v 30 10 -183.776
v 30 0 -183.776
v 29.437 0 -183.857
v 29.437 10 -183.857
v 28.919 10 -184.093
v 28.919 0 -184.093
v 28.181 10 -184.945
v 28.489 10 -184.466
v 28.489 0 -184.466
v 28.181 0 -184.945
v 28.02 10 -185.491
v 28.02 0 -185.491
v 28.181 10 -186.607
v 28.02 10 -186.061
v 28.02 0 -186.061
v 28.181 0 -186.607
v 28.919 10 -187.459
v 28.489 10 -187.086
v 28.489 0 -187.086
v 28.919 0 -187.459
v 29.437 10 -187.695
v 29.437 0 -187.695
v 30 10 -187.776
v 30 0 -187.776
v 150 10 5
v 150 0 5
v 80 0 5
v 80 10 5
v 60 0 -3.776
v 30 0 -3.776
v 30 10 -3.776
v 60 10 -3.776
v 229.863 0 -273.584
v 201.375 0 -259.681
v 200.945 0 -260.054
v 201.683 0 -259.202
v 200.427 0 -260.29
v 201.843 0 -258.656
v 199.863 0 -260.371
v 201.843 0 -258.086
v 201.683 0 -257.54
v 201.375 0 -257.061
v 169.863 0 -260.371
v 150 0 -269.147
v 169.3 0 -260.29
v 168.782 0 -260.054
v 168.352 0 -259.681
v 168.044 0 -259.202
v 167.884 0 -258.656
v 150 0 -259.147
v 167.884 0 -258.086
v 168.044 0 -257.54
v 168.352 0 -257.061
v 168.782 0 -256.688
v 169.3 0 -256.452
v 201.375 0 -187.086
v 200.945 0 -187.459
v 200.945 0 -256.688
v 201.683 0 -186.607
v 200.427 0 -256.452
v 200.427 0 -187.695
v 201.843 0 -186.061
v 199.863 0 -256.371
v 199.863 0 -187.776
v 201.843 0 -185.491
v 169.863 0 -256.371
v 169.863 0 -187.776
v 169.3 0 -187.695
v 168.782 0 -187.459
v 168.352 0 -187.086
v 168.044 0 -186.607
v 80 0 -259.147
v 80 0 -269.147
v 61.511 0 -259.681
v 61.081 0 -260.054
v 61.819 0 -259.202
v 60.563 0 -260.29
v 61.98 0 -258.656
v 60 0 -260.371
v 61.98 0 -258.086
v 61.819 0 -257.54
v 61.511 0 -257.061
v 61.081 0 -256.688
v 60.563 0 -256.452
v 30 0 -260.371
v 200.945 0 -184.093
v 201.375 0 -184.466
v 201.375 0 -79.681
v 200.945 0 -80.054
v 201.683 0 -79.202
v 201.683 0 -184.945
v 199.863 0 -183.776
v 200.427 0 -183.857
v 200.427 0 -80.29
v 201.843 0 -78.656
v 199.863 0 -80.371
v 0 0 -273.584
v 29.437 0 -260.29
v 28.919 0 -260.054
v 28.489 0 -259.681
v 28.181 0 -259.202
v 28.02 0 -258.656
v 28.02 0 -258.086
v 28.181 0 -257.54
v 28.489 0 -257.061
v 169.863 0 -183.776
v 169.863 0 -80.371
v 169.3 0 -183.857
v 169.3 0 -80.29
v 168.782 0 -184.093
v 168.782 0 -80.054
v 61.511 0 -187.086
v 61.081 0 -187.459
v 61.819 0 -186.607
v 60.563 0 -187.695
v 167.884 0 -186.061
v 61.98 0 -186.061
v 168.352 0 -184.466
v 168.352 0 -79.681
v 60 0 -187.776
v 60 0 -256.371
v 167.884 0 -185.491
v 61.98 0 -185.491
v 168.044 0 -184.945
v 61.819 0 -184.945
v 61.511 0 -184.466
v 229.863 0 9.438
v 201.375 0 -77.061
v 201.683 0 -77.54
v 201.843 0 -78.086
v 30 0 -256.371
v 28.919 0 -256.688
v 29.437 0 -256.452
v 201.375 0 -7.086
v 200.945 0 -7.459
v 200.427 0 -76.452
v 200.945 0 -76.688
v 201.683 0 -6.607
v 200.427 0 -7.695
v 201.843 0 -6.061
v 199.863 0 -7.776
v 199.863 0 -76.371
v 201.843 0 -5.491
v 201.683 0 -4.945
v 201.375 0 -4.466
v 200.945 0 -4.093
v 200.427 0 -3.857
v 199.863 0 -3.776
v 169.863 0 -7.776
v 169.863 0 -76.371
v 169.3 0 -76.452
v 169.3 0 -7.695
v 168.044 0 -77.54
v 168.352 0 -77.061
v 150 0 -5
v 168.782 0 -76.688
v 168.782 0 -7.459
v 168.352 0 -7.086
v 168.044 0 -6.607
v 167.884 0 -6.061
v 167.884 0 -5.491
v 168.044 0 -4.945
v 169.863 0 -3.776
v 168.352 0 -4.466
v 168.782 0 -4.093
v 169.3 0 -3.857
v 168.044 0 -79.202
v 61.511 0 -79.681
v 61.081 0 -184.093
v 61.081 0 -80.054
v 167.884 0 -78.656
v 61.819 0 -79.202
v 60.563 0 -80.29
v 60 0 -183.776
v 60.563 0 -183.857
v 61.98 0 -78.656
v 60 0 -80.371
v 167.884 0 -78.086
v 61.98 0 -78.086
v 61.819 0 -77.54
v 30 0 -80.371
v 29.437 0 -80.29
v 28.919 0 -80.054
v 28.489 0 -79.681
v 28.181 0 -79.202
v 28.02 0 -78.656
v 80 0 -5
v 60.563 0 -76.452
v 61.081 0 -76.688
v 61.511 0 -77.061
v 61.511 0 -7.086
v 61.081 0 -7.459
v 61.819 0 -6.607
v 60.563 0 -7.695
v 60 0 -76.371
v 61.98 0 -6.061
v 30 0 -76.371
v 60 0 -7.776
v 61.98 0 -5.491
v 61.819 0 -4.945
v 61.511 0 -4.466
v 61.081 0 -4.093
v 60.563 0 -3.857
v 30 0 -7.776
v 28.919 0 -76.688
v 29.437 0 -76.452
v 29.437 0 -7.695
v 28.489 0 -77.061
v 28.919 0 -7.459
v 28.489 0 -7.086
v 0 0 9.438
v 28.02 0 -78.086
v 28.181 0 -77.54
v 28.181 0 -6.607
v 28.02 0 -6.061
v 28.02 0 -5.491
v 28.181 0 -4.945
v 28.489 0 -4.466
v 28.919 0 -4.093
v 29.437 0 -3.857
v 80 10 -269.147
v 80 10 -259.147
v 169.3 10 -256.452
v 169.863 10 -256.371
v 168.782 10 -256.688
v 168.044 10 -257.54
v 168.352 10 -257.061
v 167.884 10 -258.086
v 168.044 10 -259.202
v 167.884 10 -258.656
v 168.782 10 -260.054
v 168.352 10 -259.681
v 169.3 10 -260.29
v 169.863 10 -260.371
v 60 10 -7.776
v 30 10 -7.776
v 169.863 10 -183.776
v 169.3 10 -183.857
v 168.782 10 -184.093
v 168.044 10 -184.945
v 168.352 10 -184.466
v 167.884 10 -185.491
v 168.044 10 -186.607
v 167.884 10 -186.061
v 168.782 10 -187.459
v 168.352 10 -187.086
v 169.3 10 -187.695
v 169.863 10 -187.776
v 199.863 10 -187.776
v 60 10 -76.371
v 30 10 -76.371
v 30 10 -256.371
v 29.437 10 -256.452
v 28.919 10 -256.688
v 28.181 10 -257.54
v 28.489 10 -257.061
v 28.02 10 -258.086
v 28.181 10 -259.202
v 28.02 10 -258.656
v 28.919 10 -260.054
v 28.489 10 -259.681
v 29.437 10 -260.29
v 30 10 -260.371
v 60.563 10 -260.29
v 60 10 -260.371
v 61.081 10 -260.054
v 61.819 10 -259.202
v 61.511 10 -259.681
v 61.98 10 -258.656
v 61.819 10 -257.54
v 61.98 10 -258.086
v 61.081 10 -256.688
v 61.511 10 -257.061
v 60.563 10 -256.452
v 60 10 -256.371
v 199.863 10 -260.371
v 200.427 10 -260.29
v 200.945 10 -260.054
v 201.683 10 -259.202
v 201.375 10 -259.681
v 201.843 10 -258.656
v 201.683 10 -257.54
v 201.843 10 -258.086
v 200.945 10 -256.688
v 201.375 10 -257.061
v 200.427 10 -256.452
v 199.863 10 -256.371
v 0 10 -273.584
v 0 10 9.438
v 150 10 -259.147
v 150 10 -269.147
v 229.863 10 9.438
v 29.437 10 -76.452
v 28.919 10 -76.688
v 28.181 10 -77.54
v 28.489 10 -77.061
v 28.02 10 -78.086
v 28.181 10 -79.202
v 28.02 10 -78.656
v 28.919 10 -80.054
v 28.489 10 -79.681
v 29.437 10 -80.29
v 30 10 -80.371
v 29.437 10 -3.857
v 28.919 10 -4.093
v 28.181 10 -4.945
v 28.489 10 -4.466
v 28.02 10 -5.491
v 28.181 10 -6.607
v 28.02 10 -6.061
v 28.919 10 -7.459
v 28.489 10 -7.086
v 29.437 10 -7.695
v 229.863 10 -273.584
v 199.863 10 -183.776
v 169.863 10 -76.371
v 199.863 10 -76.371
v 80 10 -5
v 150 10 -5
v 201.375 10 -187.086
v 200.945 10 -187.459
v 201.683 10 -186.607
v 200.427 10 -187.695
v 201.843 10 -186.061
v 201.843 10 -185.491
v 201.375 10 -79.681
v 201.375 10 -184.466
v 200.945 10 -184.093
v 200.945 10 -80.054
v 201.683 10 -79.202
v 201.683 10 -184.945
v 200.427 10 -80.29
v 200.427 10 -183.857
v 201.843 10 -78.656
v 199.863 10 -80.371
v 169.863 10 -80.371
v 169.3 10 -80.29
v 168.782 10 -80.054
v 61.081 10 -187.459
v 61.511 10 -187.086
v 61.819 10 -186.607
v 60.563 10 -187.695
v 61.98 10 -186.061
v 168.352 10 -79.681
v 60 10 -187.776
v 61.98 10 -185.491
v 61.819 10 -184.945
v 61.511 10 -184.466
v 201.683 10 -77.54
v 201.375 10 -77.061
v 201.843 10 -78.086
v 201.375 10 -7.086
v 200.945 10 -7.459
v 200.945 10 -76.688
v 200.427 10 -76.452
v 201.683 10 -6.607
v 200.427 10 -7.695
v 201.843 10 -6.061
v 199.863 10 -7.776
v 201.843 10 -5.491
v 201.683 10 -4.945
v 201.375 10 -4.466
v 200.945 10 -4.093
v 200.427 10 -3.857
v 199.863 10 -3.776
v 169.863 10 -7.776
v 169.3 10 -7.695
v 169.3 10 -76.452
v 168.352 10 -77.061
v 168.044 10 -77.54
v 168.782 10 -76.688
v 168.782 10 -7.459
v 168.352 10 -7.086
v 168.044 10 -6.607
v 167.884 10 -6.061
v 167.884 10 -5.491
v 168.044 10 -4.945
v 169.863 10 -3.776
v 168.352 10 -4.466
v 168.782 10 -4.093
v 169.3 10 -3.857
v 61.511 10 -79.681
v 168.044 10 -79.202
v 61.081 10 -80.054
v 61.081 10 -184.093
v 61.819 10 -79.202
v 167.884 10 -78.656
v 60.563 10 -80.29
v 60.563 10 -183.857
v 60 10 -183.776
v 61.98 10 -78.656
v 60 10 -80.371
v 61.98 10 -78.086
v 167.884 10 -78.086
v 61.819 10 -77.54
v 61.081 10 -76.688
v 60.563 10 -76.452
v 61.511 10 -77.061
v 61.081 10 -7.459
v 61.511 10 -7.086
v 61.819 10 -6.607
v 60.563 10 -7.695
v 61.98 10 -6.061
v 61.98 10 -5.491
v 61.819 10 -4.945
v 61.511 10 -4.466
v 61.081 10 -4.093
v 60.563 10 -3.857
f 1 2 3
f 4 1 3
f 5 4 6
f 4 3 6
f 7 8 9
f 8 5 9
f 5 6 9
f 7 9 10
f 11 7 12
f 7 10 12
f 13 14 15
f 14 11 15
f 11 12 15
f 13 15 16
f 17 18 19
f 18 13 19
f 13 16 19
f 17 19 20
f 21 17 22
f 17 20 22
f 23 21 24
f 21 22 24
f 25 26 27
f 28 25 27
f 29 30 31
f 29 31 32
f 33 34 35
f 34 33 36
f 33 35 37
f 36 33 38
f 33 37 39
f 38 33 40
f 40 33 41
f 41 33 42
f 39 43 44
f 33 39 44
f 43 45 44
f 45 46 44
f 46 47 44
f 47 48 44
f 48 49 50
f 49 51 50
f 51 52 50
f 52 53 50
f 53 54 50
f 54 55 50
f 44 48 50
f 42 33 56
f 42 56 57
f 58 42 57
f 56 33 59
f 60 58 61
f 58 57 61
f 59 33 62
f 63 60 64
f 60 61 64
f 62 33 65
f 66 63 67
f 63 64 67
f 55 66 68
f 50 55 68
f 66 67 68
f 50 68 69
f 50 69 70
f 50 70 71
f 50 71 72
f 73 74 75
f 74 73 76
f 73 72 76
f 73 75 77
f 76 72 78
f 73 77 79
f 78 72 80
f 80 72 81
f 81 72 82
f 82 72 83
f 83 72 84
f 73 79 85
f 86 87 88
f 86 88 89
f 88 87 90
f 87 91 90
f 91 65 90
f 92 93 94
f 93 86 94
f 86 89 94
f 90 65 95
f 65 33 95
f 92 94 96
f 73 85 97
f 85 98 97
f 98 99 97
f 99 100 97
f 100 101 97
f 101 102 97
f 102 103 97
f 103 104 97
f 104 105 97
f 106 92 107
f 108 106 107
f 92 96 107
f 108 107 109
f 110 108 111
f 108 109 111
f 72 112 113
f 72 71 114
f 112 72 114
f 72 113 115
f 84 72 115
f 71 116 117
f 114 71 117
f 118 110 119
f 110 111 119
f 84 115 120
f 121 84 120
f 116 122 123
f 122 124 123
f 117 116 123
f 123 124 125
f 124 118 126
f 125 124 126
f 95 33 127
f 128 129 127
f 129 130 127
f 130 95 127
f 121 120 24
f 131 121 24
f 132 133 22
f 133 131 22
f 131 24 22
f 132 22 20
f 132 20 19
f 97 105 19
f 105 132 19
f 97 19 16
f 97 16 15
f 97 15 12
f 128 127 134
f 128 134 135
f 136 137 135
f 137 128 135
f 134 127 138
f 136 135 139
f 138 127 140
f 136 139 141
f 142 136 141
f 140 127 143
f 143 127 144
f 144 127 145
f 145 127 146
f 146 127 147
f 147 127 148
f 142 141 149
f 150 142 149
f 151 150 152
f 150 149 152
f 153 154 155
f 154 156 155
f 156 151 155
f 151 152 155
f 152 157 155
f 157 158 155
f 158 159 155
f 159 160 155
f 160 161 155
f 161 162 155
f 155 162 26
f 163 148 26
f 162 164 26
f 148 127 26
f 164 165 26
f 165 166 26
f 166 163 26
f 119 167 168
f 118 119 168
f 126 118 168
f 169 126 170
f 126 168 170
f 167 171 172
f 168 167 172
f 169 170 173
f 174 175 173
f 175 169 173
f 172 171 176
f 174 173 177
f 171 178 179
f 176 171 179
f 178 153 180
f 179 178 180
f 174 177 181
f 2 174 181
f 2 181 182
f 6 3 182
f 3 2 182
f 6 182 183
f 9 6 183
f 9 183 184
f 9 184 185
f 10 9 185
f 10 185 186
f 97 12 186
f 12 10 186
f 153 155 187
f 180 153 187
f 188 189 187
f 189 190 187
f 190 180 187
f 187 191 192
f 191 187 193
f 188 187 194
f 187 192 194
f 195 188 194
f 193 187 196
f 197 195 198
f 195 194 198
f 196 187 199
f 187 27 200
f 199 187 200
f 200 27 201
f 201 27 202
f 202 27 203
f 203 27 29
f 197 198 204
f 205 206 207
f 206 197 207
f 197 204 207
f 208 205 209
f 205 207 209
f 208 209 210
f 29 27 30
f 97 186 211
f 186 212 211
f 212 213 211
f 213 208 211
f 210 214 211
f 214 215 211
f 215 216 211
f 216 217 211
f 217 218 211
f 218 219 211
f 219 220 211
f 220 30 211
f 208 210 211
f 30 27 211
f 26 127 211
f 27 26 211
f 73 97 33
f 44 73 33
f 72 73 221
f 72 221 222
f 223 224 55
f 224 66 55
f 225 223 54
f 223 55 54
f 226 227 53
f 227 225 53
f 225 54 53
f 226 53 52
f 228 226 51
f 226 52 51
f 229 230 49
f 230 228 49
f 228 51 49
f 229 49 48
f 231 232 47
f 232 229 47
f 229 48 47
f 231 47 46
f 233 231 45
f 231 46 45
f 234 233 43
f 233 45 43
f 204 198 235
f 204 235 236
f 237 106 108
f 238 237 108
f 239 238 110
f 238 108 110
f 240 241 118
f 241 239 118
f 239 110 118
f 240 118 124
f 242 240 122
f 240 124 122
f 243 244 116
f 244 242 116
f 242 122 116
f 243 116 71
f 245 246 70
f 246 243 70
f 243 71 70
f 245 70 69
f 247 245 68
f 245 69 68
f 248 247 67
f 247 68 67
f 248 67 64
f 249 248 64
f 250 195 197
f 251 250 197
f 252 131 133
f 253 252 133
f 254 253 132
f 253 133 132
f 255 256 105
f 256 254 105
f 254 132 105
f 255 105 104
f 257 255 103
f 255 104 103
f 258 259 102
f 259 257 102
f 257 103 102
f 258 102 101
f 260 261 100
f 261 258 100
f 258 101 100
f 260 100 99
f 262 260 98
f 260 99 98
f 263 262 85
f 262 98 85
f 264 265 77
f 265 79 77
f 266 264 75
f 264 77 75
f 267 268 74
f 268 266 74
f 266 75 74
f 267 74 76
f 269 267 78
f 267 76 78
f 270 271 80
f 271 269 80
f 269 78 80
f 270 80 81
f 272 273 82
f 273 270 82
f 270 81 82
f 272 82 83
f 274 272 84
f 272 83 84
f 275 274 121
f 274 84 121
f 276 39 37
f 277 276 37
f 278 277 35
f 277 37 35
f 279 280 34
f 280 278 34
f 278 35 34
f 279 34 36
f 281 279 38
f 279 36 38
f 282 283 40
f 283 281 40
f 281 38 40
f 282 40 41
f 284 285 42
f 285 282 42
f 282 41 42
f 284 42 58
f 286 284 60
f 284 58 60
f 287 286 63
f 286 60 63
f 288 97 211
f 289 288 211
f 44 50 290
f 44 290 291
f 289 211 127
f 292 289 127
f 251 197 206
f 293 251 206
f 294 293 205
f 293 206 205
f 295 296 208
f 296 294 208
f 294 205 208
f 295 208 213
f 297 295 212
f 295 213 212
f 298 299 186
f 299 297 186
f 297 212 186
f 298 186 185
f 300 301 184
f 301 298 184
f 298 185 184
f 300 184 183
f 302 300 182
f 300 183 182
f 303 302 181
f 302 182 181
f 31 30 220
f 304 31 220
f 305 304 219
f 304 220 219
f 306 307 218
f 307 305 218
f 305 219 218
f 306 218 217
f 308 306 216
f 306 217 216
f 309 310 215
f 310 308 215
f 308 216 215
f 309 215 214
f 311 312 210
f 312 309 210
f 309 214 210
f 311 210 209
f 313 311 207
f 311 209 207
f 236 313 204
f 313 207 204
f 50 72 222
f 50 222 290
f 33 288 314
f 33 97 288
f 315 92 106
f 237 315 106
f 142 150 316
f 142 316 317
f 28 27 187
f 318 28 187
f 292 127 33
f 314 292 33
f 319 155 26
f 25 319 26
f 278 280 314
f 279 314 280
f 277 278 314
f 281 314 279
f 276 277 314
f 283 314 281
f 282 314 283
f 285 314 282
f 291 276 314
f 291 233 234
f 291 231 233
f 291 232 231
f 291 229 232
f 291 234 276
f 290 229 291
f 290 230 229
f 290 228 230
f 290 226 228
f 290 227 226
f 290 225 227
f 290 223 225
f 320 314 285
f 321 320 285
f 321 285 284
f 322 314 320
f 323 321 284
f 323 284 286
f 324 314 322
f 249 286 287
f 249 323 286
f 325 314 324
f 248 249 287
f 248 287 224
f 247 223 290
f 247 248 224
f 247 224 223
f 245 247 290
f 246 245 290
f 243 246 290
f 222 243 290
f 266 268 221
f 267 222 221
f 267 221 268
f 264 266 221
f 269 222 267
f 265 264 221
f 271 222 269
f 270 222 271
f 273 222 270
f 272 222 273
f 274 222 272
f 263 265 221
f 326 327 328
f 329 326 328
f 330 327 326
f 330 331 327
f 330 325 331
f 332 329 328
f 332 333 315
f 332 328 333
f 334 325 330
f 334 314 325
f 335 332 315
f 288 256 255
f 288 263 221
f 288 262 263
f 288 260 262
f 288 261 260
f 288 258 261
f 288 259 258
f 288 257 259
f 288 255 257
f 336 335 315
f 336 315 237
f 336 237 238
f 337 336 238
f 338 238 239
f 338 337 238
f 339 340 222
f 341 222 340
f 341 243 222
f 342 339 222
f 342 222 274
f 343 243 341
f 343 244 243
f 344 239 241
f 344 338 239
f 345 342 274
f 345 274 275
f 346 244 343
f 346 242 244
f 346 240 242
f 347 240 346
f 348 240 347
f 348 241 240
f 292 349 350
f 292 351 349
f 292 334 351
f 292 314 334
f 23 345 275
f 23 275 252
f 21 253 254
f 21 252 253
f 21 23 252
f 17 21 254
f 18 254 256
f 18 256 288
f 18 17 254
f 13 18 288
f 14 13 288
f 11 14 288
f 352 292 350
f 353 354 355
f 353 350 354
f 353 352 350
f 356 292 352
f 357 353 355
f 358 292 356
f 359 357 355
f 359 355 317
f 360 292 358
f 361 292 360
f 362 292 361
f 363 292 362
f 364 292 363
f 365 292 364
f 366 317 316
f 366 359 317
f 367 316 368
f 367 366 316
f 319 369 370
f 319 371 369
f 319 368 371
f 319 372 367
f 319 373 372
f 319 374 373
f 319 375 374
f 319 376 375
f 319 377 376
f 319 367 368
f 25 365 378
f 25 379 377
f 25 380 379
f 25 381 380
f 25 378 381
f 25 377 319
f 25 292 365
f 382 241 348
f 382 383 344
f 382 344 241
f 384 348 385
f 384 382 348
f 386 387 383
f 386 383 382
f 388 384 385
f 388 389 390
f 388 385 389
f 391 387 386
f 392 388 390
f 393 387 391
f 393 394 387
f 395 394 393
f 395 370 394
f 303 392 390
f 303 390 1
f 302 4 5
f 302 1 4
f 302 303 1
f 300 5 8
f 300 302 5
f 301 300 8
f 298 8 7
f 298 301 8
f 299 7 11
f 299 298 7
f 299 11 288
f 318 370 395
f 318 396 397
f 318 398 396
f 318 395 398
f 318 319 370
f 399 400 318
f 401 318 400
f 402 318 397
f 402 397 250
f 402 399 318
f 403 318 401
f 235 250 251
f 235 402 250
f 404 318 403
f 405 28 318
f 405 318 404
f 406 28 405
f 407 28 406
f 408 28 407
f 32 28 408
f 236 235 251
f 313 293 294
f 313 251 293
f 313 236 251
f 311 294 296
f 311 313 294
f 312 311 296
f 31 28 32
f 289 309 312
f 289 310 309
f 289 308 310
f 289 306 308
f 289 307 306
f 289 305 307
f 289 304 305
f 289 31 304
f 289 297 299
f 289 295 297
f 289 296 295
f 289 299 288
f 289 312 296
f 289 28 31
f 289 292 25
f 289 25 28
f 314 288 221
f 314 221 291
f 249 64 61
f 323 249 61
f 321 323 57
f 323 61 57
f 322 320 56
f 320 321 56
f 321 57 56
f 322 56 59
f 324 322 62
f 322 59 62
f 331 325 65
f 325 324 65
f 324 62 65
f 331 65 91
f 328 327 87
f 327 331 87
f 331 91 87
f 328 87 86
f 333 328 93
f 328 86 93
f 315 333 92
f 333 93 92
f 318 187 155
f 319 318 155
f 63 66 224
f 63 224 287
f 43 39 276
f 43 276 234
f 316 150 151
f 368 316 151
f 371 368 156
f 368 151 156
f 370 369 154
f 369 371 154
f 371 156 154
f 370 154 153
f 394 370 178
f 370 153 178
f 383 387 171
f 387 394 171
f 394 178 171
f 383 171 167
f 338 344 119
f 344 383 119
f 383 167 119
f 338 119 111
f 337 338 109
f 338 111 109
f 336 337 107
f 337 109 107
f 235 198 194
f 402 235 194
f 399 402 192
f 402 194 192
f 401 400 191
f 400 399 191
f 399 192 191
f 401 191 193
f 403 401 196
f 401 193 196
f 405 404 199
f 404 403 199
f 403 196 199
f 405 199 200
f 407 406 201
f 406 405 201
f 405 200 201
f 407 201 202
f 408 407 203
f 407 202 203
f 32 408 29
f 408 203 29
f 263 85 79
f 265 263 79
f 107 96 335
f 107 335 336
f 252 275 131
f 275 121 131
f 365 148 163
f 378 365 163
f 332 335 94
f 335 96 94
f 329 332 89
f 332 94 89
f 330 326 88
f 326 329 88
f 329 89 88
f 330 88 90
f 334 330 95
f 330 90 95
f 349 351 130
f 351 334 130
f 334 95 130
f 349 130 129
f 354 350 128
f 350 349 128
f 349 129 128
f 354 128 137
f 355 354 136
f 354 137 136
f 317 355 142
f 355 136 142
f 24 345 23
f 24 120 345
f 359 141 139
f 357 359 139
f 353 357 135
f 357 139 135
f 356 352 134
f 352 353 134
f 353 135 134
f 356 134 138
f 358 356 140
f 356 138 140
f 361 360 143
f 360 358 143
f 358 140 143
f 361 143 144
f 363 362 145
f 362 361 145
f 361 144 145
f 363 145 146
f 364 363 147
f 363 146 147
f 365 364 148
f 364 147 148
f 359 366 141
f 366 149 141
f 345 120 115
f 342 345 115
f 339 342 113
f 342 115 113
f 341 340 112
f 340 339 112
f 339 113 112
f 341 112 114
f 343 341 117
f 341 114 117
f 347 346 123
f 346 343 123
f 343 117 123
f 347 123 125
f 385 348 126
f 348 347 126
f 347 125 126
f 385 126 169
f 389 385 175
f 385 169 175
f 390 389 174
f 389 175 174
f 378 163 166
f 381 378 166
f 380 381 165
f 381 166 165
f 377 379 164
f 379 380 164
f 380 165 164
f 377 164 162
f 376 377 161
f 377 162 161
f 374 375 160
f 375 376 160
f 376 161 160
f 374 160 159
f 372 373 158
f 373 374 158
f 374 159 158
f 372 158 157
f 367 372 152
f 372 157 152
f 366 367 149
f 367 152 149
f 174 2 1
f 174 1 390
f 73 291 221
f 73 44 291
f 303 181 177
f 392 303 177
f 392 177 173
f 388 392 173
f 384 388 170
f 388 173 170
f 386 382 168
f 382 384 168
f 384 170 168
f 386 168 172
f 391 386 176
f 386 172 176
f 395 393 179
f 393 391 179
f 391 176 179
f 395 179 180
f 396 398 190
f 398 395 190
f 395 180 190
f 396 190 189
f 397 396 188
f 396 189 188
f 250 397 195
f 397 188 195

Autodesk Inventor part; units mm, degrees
ref_plane "YZ Plane" through (0, 0, 0) normal (1, 0, 0) x (0, 1, 0)
ref_plane "XZ Plane" through (0, 0, 0) normal (0, 1, 0) x (-1, 0, 0)
ref_plane "XY Plane" through (0, 0, 0) normal (0, 0, 1) x (1, 0, 0)
sketch "Sketch1" plane through (0, 0, 0) normal (0, 1, 0) x (-1, 0, 0)
  line L0 (-229.8634, 7.9265) -> (-229.8634, -272.0735)
  line L1 (0, -264.1469) -> (0, 0)
  line L2 (-114.9317, 7.8456) -> (-114.9317, -271.9925) construction
  line L3 (-229.8634, -132.0735) -> (0, -132.0735) construction
  line L4 (0, -222.0735) -> (-229.8634, -222.0735) construction
  line L5 (0.0192, -20.1711) -> (0, -20.138) construction
  line L6 (0.9366, -42.0735) -> (-229.8634, -42.0735) construction
  line L7 (-39.8418, -42.0735) -> (-39.8418, -2.1597) construction
  line L8 (-39.8418, -5.776) -> (-30, -5.776)
  line L9 (-39.8418, -5.776) -> (-60, -5.776)
  line L10 (-30, -5.776) -> (-60, -5.776) construction
  line L11 (-30, -3.776) -> (-60, -3.776)
  line L12 (-60, -7.776) -> (-30, -7.776)
  arc A0 (-30, -7.776) -> (-30, -3.776) centre (-30, -5.776) ccw
  arc A1 (-60, -3.776) -> (-60, -7.776) centre (-60, -5.776) ccw
  line L13 (-39.8418, -78.371) -> (-30, -78.371)
  line L14 (-39.8418, -78.371) -> (-60, -78.371)
  line L15 (-30, -78.371) -> (-60, -78.371) construction
  line L16 (-30, -80.371) -> (-60, -80.371)
  line L17 (-60, -76.371) -> (-30, -76.371)
  arc A2 (-30, -80.371) -> (-30, -76.371) centre (-30, -78.371) ccw
  arc A3 (-60, -76.371) -> (-60, -80.371) centre (-60, -78.371) ccw
  line L18 (-231.5784, -23.0949) -> (-148.4647, -23.0949) construction
  line L19 (-148.4647, -23.0949) -> (-148.4647, -61.0949) construction
  line L20 (-148.4647, -61.0949) -> (-231.5784, -61.0949) construction
  line L21 (-190.0216, -5.776) -> (-199.8634, -5.776)
  line L22 (-190.0216, -5.776) -> (-169.8634, -5.776)
  line L23 (-199.8634, -5.776) -> (-169.8634, -5.776) construction
  line L24 (-199.8634, -3.776) -> (-169.8634, -3.776)
  line L25 (-169.8634, -7.776) -> (-199.8634, -7.776)
  arc A4 (-199.8634, -3.776) -> (-199.8634, -7.776) centre (-199.8634, -5.776) ccw
  arc A5 (-169.8634, -7.776) -> (-169.8634, -3.776) centre (-169.8634, -5.776) ccw
  arc A6 (-169.8634, -80.371) -> (-169.8634, -76.371) centre (-169.8634, -78.371) ccw
  line L26 (-190.0216, -78.371) -> (-169.8634, -78.371)
  line L27 (-169.8634, -76.371) -> (-199.8634, -76.371)
  line L28 (-190.0216, -78.371) -> (-199.8634, -78.371)
  line L29 (-199.8634, -78.371) -> (-169.8634, -78.371) construction
  line L30 (-199.8634, -80.371) -> (-169.8634, -80.371)
  arc A7 (-199.8634, -76.371) -> (-199.8634, -80.371) centre (-199.8634, -78.371) ccw
  line L31 (-114.9317, -271.9925) -> (-114.9317, 7.8456) construction
  line L32 (0, -222.0735) -> (-229.8634, -222.0735) construction
  line L33 (-15.354, -241.052) -> (-98.4678, -241.052) construction
  line L34 (-98.4678, -241.052) -> (-98.4678, -203.052) construction
  line L35 (-98.4678, -203.052) -> (-15.354, -203.052) construction
  line L36 (-39.8418, -222.0735) -> (-39.8418, -261.9872) construction
  line L37 (-39.8418, -258.371) -> (-30, -258.371)
  line L38 (-39.8418, -258.371) -> (-60, -258.371)
  line L39 (-30, -258.371) -> (-60, -258.371) construction
  line L40 (-30, -260.371) -> (-60, -260.371)
  line L41 (-60, -256.371) -> (-30, -256.371)
  arc A8 (-30, -260.371) -> (-30, -256.371) centre (-30, -258.371) ccw
  arc A9 (-60, -256.371) -> (-60, -260.371) centre (-60, -258.371) ccw
  arc A10 (-60, -183.776) -> (-60, -187.776) centre (-60, -185.776) ccw
  line L42 (-39.8418, -185.776) -> (-60, -185.776)
  line L43 (-60, -187.776) -> (-30, -187.776)
  line L44 (-39.8418, -185.776) -> (-30, -185.776)
  line L45 (-30, -185.776) -> (-60, -185.776) construction
  line L46 (-30, -183.776) -> (-60, -183.776)
  arc A11 (-30, -187.776) -> (-30, -183.776) centre (-30, -185.776) ccw
  line L47 (-148.4647, -241.052) -> (-148.4647, -203.052) construction
  line L48 (-169.8634, -256.371) -> (-199.8634, -256.371)
  line L49 (-190.0216, -258.371) -> (-199.8634, -258.371)
  line L50 (-190.0216, -258.371) -> (-169.8634, -258.371)
  arc A12 (-199.8634, -256.371) -> (-199.8634, -260.371) centre (-199.8634, -258.371) ccw
  line L51 (-199.8634, -260.371) -> (-169.8634, -260.371)
  arc A13 (-169.8634, -260.371) -> (-169.8634, -256.371) centre (-169.8634, -258.371) ccw
  line L52 (-199.8634, -258.371) -> (-169.8634, -258.371) construction
  line L53 (-169.8634, -187.776) -> (-199.8634, -187.776)
  line L54 (-190.0216, -185.776) -> (-199.8634, -185.776)
  arc A14 (-199.8634, -183.776) -> (-199.8634, -187.776) centre (-199.8634, -185.776) ccw
  line L55 (-199.8634, -185.776) -> (-169.8634, -185.776) construction
  line L56 (-199.8634, -183.776) -> (-169.8634, -183.776)
  line L57 (-190.0216, -185.776) -> (-169.8634, -185.776)
  arc A15 (-169.8634, -187.776) -> (-169.8634, -183.776) centre (-169.8634, -185.776) ccw
  line L58 (-148.4647, -203.052) -> (-231.5784, -203.052) construction
  line L59 (-231.5784, -241.052) -> (-148.4647, -241.052) construction
  line L60 (-192.7799, 9.4375) -> (-30.2751, 9.4375)
  line L61 (-192.7799, -273.5844) -> (-30.2751, -273.5844)
  line L62 (-80, -5) -> (-150, -5)
  line L63 (-150, -5) -> (-150, 5)
  line L64 (-150, 5) -> (-80, 5)
  line L65 (-80, 5) -> (-80, -5)
  line L66 (-80, -259.1469) -> (-150, -259.1469)
  line L67 (-150, -259.1469) -> (-150, -269.1469)
  line L68 (-150, -269.1469) -> (-80, -269.1469)
  line L69 (-80, -269.1469) -> (-80, -259.1469)
  line L70 (0, 0) -> (0, 9.4375)
  line L71 (0, 9.4375) -> (-30.2751, 9.4375)
  line L72 (-192.7799, 9.4375) -> (-229.8634, 9.4375)
  line L73 (-229.8634, 9.4375) -> (-229.8634, 7.9265)
  line L74 (0, -264.1469) -> (0, -273.5844)
  line L75 (0, -273.5844) -> (-30.2751, -273.5844)
  line L76 (-192.7799, -273.5844) -> (-229.8634, -273.5844)
  line L77 (-229.8634, -273.5844) -> (-229.8634, -272.0735)
  point P0 (-39.8418, -23.0949)
  point P1 (-45, -5.776)
  point P2 (-45, -78.371)
  point P3 (-190.0216, -42.0735)
  point P4 (-190.0216, -23.0949)
  point P5 (-184.8634, -5.776)
  point P6 (-184.8634, -78.371)
  point P7 (-39.8418, -241.052)
  point P8 (-45, -258.371)
  point P9 (-45, -185.776)
  point P10 (-190.0216, -222.0735)
  point P11 (-190.0216, -241.052)
  point P12 (-184.8634, -185.776)
  point P13 (-184.8634, -258.371)
  point P14 (-114.9317, 2.9056)
  point P15 (-45, -78.371)
  point P16 (-45, -185.776)
  point P17 (-114.9317, -267.0525)
  point P18 (-184.8634, -185.776)
  point P19 (-45, -258.371)
  point P20 (-229.8634, -272.8289)
  dimension "d25" = 4
  dimension "d34" = 30
  dimension "d36" = 280
  dimension "d47" = 45
  dimension "d49" = 45
  dimension "d50" = 45
  dimension "d51" = 229.8634
extrude "Extrusion1" add sketch "Sketch1" along normal blind 10 contours L73 L72 L60 L71 L70 L1 L74 L75 L61 L76 L77 L0 | A0 L12 A1 L11 | L16 A3 L17 A2 | L24 A5 L25 A4 | L30 A7 L27 A6 | L40 A9 L41 A8 | L46 A11 L43 A10 | A13 L51 A12 L48 | L53 A14 L56 A15 | L62 L63 L64 L65 | L69 L68 L67 L66
extrude "Extrusion2" cut sketch "Sketch1" along normal through all contours A0 L12 A1 L11 | L16 A3 L17 A2 | L24 A5 L25 A4 | L30 A7 L27 A6 | L40 A9 L41 A8 | L46 A11 L43 A10 | A13 L51 A12 L48 | L53 A14 L56 A15
extrude "Extrusion4" add sketch "Sketch1" along normal blind 10 contours L73 L72 L60 L71 L70 L1 L74 L75 L61 L76 L77 L0 | A0 L12 A1 L11 | L16 A3 L17 A2 | L24 A5 L25 A4 | L30 A7 L27 A6 | L40 A9 L41 A8 | L46 A11 L43 A10 | A13 L51 A12 L48 | L53 A14 L56 A15 | L62 L63 L64 L65 | L69 L68 L67 L66
extrude "Extrusion5" cut sketch "Sketch1" along normal blind 10 contours L62 L63 L64 L65 | L69 L68 L67 L66
extrude "Extrusion6" cut sketch "Sketch1" along normal blind 10 contours L24 A5 L25 A4
extrude "Extrusion7" cut sketch "Sketch1" along normal blind 10 contours A0 L12 A1 L11 | L16 A3 L17 A2 | L30 A7 L27 A6 | L40 A9 L41 A8 | L46 A11 L43 A10 | A13 L51 A12 L48 | L53 A14 L56 A15
properties part number "floor" material "Brass, Soft Yellow"
